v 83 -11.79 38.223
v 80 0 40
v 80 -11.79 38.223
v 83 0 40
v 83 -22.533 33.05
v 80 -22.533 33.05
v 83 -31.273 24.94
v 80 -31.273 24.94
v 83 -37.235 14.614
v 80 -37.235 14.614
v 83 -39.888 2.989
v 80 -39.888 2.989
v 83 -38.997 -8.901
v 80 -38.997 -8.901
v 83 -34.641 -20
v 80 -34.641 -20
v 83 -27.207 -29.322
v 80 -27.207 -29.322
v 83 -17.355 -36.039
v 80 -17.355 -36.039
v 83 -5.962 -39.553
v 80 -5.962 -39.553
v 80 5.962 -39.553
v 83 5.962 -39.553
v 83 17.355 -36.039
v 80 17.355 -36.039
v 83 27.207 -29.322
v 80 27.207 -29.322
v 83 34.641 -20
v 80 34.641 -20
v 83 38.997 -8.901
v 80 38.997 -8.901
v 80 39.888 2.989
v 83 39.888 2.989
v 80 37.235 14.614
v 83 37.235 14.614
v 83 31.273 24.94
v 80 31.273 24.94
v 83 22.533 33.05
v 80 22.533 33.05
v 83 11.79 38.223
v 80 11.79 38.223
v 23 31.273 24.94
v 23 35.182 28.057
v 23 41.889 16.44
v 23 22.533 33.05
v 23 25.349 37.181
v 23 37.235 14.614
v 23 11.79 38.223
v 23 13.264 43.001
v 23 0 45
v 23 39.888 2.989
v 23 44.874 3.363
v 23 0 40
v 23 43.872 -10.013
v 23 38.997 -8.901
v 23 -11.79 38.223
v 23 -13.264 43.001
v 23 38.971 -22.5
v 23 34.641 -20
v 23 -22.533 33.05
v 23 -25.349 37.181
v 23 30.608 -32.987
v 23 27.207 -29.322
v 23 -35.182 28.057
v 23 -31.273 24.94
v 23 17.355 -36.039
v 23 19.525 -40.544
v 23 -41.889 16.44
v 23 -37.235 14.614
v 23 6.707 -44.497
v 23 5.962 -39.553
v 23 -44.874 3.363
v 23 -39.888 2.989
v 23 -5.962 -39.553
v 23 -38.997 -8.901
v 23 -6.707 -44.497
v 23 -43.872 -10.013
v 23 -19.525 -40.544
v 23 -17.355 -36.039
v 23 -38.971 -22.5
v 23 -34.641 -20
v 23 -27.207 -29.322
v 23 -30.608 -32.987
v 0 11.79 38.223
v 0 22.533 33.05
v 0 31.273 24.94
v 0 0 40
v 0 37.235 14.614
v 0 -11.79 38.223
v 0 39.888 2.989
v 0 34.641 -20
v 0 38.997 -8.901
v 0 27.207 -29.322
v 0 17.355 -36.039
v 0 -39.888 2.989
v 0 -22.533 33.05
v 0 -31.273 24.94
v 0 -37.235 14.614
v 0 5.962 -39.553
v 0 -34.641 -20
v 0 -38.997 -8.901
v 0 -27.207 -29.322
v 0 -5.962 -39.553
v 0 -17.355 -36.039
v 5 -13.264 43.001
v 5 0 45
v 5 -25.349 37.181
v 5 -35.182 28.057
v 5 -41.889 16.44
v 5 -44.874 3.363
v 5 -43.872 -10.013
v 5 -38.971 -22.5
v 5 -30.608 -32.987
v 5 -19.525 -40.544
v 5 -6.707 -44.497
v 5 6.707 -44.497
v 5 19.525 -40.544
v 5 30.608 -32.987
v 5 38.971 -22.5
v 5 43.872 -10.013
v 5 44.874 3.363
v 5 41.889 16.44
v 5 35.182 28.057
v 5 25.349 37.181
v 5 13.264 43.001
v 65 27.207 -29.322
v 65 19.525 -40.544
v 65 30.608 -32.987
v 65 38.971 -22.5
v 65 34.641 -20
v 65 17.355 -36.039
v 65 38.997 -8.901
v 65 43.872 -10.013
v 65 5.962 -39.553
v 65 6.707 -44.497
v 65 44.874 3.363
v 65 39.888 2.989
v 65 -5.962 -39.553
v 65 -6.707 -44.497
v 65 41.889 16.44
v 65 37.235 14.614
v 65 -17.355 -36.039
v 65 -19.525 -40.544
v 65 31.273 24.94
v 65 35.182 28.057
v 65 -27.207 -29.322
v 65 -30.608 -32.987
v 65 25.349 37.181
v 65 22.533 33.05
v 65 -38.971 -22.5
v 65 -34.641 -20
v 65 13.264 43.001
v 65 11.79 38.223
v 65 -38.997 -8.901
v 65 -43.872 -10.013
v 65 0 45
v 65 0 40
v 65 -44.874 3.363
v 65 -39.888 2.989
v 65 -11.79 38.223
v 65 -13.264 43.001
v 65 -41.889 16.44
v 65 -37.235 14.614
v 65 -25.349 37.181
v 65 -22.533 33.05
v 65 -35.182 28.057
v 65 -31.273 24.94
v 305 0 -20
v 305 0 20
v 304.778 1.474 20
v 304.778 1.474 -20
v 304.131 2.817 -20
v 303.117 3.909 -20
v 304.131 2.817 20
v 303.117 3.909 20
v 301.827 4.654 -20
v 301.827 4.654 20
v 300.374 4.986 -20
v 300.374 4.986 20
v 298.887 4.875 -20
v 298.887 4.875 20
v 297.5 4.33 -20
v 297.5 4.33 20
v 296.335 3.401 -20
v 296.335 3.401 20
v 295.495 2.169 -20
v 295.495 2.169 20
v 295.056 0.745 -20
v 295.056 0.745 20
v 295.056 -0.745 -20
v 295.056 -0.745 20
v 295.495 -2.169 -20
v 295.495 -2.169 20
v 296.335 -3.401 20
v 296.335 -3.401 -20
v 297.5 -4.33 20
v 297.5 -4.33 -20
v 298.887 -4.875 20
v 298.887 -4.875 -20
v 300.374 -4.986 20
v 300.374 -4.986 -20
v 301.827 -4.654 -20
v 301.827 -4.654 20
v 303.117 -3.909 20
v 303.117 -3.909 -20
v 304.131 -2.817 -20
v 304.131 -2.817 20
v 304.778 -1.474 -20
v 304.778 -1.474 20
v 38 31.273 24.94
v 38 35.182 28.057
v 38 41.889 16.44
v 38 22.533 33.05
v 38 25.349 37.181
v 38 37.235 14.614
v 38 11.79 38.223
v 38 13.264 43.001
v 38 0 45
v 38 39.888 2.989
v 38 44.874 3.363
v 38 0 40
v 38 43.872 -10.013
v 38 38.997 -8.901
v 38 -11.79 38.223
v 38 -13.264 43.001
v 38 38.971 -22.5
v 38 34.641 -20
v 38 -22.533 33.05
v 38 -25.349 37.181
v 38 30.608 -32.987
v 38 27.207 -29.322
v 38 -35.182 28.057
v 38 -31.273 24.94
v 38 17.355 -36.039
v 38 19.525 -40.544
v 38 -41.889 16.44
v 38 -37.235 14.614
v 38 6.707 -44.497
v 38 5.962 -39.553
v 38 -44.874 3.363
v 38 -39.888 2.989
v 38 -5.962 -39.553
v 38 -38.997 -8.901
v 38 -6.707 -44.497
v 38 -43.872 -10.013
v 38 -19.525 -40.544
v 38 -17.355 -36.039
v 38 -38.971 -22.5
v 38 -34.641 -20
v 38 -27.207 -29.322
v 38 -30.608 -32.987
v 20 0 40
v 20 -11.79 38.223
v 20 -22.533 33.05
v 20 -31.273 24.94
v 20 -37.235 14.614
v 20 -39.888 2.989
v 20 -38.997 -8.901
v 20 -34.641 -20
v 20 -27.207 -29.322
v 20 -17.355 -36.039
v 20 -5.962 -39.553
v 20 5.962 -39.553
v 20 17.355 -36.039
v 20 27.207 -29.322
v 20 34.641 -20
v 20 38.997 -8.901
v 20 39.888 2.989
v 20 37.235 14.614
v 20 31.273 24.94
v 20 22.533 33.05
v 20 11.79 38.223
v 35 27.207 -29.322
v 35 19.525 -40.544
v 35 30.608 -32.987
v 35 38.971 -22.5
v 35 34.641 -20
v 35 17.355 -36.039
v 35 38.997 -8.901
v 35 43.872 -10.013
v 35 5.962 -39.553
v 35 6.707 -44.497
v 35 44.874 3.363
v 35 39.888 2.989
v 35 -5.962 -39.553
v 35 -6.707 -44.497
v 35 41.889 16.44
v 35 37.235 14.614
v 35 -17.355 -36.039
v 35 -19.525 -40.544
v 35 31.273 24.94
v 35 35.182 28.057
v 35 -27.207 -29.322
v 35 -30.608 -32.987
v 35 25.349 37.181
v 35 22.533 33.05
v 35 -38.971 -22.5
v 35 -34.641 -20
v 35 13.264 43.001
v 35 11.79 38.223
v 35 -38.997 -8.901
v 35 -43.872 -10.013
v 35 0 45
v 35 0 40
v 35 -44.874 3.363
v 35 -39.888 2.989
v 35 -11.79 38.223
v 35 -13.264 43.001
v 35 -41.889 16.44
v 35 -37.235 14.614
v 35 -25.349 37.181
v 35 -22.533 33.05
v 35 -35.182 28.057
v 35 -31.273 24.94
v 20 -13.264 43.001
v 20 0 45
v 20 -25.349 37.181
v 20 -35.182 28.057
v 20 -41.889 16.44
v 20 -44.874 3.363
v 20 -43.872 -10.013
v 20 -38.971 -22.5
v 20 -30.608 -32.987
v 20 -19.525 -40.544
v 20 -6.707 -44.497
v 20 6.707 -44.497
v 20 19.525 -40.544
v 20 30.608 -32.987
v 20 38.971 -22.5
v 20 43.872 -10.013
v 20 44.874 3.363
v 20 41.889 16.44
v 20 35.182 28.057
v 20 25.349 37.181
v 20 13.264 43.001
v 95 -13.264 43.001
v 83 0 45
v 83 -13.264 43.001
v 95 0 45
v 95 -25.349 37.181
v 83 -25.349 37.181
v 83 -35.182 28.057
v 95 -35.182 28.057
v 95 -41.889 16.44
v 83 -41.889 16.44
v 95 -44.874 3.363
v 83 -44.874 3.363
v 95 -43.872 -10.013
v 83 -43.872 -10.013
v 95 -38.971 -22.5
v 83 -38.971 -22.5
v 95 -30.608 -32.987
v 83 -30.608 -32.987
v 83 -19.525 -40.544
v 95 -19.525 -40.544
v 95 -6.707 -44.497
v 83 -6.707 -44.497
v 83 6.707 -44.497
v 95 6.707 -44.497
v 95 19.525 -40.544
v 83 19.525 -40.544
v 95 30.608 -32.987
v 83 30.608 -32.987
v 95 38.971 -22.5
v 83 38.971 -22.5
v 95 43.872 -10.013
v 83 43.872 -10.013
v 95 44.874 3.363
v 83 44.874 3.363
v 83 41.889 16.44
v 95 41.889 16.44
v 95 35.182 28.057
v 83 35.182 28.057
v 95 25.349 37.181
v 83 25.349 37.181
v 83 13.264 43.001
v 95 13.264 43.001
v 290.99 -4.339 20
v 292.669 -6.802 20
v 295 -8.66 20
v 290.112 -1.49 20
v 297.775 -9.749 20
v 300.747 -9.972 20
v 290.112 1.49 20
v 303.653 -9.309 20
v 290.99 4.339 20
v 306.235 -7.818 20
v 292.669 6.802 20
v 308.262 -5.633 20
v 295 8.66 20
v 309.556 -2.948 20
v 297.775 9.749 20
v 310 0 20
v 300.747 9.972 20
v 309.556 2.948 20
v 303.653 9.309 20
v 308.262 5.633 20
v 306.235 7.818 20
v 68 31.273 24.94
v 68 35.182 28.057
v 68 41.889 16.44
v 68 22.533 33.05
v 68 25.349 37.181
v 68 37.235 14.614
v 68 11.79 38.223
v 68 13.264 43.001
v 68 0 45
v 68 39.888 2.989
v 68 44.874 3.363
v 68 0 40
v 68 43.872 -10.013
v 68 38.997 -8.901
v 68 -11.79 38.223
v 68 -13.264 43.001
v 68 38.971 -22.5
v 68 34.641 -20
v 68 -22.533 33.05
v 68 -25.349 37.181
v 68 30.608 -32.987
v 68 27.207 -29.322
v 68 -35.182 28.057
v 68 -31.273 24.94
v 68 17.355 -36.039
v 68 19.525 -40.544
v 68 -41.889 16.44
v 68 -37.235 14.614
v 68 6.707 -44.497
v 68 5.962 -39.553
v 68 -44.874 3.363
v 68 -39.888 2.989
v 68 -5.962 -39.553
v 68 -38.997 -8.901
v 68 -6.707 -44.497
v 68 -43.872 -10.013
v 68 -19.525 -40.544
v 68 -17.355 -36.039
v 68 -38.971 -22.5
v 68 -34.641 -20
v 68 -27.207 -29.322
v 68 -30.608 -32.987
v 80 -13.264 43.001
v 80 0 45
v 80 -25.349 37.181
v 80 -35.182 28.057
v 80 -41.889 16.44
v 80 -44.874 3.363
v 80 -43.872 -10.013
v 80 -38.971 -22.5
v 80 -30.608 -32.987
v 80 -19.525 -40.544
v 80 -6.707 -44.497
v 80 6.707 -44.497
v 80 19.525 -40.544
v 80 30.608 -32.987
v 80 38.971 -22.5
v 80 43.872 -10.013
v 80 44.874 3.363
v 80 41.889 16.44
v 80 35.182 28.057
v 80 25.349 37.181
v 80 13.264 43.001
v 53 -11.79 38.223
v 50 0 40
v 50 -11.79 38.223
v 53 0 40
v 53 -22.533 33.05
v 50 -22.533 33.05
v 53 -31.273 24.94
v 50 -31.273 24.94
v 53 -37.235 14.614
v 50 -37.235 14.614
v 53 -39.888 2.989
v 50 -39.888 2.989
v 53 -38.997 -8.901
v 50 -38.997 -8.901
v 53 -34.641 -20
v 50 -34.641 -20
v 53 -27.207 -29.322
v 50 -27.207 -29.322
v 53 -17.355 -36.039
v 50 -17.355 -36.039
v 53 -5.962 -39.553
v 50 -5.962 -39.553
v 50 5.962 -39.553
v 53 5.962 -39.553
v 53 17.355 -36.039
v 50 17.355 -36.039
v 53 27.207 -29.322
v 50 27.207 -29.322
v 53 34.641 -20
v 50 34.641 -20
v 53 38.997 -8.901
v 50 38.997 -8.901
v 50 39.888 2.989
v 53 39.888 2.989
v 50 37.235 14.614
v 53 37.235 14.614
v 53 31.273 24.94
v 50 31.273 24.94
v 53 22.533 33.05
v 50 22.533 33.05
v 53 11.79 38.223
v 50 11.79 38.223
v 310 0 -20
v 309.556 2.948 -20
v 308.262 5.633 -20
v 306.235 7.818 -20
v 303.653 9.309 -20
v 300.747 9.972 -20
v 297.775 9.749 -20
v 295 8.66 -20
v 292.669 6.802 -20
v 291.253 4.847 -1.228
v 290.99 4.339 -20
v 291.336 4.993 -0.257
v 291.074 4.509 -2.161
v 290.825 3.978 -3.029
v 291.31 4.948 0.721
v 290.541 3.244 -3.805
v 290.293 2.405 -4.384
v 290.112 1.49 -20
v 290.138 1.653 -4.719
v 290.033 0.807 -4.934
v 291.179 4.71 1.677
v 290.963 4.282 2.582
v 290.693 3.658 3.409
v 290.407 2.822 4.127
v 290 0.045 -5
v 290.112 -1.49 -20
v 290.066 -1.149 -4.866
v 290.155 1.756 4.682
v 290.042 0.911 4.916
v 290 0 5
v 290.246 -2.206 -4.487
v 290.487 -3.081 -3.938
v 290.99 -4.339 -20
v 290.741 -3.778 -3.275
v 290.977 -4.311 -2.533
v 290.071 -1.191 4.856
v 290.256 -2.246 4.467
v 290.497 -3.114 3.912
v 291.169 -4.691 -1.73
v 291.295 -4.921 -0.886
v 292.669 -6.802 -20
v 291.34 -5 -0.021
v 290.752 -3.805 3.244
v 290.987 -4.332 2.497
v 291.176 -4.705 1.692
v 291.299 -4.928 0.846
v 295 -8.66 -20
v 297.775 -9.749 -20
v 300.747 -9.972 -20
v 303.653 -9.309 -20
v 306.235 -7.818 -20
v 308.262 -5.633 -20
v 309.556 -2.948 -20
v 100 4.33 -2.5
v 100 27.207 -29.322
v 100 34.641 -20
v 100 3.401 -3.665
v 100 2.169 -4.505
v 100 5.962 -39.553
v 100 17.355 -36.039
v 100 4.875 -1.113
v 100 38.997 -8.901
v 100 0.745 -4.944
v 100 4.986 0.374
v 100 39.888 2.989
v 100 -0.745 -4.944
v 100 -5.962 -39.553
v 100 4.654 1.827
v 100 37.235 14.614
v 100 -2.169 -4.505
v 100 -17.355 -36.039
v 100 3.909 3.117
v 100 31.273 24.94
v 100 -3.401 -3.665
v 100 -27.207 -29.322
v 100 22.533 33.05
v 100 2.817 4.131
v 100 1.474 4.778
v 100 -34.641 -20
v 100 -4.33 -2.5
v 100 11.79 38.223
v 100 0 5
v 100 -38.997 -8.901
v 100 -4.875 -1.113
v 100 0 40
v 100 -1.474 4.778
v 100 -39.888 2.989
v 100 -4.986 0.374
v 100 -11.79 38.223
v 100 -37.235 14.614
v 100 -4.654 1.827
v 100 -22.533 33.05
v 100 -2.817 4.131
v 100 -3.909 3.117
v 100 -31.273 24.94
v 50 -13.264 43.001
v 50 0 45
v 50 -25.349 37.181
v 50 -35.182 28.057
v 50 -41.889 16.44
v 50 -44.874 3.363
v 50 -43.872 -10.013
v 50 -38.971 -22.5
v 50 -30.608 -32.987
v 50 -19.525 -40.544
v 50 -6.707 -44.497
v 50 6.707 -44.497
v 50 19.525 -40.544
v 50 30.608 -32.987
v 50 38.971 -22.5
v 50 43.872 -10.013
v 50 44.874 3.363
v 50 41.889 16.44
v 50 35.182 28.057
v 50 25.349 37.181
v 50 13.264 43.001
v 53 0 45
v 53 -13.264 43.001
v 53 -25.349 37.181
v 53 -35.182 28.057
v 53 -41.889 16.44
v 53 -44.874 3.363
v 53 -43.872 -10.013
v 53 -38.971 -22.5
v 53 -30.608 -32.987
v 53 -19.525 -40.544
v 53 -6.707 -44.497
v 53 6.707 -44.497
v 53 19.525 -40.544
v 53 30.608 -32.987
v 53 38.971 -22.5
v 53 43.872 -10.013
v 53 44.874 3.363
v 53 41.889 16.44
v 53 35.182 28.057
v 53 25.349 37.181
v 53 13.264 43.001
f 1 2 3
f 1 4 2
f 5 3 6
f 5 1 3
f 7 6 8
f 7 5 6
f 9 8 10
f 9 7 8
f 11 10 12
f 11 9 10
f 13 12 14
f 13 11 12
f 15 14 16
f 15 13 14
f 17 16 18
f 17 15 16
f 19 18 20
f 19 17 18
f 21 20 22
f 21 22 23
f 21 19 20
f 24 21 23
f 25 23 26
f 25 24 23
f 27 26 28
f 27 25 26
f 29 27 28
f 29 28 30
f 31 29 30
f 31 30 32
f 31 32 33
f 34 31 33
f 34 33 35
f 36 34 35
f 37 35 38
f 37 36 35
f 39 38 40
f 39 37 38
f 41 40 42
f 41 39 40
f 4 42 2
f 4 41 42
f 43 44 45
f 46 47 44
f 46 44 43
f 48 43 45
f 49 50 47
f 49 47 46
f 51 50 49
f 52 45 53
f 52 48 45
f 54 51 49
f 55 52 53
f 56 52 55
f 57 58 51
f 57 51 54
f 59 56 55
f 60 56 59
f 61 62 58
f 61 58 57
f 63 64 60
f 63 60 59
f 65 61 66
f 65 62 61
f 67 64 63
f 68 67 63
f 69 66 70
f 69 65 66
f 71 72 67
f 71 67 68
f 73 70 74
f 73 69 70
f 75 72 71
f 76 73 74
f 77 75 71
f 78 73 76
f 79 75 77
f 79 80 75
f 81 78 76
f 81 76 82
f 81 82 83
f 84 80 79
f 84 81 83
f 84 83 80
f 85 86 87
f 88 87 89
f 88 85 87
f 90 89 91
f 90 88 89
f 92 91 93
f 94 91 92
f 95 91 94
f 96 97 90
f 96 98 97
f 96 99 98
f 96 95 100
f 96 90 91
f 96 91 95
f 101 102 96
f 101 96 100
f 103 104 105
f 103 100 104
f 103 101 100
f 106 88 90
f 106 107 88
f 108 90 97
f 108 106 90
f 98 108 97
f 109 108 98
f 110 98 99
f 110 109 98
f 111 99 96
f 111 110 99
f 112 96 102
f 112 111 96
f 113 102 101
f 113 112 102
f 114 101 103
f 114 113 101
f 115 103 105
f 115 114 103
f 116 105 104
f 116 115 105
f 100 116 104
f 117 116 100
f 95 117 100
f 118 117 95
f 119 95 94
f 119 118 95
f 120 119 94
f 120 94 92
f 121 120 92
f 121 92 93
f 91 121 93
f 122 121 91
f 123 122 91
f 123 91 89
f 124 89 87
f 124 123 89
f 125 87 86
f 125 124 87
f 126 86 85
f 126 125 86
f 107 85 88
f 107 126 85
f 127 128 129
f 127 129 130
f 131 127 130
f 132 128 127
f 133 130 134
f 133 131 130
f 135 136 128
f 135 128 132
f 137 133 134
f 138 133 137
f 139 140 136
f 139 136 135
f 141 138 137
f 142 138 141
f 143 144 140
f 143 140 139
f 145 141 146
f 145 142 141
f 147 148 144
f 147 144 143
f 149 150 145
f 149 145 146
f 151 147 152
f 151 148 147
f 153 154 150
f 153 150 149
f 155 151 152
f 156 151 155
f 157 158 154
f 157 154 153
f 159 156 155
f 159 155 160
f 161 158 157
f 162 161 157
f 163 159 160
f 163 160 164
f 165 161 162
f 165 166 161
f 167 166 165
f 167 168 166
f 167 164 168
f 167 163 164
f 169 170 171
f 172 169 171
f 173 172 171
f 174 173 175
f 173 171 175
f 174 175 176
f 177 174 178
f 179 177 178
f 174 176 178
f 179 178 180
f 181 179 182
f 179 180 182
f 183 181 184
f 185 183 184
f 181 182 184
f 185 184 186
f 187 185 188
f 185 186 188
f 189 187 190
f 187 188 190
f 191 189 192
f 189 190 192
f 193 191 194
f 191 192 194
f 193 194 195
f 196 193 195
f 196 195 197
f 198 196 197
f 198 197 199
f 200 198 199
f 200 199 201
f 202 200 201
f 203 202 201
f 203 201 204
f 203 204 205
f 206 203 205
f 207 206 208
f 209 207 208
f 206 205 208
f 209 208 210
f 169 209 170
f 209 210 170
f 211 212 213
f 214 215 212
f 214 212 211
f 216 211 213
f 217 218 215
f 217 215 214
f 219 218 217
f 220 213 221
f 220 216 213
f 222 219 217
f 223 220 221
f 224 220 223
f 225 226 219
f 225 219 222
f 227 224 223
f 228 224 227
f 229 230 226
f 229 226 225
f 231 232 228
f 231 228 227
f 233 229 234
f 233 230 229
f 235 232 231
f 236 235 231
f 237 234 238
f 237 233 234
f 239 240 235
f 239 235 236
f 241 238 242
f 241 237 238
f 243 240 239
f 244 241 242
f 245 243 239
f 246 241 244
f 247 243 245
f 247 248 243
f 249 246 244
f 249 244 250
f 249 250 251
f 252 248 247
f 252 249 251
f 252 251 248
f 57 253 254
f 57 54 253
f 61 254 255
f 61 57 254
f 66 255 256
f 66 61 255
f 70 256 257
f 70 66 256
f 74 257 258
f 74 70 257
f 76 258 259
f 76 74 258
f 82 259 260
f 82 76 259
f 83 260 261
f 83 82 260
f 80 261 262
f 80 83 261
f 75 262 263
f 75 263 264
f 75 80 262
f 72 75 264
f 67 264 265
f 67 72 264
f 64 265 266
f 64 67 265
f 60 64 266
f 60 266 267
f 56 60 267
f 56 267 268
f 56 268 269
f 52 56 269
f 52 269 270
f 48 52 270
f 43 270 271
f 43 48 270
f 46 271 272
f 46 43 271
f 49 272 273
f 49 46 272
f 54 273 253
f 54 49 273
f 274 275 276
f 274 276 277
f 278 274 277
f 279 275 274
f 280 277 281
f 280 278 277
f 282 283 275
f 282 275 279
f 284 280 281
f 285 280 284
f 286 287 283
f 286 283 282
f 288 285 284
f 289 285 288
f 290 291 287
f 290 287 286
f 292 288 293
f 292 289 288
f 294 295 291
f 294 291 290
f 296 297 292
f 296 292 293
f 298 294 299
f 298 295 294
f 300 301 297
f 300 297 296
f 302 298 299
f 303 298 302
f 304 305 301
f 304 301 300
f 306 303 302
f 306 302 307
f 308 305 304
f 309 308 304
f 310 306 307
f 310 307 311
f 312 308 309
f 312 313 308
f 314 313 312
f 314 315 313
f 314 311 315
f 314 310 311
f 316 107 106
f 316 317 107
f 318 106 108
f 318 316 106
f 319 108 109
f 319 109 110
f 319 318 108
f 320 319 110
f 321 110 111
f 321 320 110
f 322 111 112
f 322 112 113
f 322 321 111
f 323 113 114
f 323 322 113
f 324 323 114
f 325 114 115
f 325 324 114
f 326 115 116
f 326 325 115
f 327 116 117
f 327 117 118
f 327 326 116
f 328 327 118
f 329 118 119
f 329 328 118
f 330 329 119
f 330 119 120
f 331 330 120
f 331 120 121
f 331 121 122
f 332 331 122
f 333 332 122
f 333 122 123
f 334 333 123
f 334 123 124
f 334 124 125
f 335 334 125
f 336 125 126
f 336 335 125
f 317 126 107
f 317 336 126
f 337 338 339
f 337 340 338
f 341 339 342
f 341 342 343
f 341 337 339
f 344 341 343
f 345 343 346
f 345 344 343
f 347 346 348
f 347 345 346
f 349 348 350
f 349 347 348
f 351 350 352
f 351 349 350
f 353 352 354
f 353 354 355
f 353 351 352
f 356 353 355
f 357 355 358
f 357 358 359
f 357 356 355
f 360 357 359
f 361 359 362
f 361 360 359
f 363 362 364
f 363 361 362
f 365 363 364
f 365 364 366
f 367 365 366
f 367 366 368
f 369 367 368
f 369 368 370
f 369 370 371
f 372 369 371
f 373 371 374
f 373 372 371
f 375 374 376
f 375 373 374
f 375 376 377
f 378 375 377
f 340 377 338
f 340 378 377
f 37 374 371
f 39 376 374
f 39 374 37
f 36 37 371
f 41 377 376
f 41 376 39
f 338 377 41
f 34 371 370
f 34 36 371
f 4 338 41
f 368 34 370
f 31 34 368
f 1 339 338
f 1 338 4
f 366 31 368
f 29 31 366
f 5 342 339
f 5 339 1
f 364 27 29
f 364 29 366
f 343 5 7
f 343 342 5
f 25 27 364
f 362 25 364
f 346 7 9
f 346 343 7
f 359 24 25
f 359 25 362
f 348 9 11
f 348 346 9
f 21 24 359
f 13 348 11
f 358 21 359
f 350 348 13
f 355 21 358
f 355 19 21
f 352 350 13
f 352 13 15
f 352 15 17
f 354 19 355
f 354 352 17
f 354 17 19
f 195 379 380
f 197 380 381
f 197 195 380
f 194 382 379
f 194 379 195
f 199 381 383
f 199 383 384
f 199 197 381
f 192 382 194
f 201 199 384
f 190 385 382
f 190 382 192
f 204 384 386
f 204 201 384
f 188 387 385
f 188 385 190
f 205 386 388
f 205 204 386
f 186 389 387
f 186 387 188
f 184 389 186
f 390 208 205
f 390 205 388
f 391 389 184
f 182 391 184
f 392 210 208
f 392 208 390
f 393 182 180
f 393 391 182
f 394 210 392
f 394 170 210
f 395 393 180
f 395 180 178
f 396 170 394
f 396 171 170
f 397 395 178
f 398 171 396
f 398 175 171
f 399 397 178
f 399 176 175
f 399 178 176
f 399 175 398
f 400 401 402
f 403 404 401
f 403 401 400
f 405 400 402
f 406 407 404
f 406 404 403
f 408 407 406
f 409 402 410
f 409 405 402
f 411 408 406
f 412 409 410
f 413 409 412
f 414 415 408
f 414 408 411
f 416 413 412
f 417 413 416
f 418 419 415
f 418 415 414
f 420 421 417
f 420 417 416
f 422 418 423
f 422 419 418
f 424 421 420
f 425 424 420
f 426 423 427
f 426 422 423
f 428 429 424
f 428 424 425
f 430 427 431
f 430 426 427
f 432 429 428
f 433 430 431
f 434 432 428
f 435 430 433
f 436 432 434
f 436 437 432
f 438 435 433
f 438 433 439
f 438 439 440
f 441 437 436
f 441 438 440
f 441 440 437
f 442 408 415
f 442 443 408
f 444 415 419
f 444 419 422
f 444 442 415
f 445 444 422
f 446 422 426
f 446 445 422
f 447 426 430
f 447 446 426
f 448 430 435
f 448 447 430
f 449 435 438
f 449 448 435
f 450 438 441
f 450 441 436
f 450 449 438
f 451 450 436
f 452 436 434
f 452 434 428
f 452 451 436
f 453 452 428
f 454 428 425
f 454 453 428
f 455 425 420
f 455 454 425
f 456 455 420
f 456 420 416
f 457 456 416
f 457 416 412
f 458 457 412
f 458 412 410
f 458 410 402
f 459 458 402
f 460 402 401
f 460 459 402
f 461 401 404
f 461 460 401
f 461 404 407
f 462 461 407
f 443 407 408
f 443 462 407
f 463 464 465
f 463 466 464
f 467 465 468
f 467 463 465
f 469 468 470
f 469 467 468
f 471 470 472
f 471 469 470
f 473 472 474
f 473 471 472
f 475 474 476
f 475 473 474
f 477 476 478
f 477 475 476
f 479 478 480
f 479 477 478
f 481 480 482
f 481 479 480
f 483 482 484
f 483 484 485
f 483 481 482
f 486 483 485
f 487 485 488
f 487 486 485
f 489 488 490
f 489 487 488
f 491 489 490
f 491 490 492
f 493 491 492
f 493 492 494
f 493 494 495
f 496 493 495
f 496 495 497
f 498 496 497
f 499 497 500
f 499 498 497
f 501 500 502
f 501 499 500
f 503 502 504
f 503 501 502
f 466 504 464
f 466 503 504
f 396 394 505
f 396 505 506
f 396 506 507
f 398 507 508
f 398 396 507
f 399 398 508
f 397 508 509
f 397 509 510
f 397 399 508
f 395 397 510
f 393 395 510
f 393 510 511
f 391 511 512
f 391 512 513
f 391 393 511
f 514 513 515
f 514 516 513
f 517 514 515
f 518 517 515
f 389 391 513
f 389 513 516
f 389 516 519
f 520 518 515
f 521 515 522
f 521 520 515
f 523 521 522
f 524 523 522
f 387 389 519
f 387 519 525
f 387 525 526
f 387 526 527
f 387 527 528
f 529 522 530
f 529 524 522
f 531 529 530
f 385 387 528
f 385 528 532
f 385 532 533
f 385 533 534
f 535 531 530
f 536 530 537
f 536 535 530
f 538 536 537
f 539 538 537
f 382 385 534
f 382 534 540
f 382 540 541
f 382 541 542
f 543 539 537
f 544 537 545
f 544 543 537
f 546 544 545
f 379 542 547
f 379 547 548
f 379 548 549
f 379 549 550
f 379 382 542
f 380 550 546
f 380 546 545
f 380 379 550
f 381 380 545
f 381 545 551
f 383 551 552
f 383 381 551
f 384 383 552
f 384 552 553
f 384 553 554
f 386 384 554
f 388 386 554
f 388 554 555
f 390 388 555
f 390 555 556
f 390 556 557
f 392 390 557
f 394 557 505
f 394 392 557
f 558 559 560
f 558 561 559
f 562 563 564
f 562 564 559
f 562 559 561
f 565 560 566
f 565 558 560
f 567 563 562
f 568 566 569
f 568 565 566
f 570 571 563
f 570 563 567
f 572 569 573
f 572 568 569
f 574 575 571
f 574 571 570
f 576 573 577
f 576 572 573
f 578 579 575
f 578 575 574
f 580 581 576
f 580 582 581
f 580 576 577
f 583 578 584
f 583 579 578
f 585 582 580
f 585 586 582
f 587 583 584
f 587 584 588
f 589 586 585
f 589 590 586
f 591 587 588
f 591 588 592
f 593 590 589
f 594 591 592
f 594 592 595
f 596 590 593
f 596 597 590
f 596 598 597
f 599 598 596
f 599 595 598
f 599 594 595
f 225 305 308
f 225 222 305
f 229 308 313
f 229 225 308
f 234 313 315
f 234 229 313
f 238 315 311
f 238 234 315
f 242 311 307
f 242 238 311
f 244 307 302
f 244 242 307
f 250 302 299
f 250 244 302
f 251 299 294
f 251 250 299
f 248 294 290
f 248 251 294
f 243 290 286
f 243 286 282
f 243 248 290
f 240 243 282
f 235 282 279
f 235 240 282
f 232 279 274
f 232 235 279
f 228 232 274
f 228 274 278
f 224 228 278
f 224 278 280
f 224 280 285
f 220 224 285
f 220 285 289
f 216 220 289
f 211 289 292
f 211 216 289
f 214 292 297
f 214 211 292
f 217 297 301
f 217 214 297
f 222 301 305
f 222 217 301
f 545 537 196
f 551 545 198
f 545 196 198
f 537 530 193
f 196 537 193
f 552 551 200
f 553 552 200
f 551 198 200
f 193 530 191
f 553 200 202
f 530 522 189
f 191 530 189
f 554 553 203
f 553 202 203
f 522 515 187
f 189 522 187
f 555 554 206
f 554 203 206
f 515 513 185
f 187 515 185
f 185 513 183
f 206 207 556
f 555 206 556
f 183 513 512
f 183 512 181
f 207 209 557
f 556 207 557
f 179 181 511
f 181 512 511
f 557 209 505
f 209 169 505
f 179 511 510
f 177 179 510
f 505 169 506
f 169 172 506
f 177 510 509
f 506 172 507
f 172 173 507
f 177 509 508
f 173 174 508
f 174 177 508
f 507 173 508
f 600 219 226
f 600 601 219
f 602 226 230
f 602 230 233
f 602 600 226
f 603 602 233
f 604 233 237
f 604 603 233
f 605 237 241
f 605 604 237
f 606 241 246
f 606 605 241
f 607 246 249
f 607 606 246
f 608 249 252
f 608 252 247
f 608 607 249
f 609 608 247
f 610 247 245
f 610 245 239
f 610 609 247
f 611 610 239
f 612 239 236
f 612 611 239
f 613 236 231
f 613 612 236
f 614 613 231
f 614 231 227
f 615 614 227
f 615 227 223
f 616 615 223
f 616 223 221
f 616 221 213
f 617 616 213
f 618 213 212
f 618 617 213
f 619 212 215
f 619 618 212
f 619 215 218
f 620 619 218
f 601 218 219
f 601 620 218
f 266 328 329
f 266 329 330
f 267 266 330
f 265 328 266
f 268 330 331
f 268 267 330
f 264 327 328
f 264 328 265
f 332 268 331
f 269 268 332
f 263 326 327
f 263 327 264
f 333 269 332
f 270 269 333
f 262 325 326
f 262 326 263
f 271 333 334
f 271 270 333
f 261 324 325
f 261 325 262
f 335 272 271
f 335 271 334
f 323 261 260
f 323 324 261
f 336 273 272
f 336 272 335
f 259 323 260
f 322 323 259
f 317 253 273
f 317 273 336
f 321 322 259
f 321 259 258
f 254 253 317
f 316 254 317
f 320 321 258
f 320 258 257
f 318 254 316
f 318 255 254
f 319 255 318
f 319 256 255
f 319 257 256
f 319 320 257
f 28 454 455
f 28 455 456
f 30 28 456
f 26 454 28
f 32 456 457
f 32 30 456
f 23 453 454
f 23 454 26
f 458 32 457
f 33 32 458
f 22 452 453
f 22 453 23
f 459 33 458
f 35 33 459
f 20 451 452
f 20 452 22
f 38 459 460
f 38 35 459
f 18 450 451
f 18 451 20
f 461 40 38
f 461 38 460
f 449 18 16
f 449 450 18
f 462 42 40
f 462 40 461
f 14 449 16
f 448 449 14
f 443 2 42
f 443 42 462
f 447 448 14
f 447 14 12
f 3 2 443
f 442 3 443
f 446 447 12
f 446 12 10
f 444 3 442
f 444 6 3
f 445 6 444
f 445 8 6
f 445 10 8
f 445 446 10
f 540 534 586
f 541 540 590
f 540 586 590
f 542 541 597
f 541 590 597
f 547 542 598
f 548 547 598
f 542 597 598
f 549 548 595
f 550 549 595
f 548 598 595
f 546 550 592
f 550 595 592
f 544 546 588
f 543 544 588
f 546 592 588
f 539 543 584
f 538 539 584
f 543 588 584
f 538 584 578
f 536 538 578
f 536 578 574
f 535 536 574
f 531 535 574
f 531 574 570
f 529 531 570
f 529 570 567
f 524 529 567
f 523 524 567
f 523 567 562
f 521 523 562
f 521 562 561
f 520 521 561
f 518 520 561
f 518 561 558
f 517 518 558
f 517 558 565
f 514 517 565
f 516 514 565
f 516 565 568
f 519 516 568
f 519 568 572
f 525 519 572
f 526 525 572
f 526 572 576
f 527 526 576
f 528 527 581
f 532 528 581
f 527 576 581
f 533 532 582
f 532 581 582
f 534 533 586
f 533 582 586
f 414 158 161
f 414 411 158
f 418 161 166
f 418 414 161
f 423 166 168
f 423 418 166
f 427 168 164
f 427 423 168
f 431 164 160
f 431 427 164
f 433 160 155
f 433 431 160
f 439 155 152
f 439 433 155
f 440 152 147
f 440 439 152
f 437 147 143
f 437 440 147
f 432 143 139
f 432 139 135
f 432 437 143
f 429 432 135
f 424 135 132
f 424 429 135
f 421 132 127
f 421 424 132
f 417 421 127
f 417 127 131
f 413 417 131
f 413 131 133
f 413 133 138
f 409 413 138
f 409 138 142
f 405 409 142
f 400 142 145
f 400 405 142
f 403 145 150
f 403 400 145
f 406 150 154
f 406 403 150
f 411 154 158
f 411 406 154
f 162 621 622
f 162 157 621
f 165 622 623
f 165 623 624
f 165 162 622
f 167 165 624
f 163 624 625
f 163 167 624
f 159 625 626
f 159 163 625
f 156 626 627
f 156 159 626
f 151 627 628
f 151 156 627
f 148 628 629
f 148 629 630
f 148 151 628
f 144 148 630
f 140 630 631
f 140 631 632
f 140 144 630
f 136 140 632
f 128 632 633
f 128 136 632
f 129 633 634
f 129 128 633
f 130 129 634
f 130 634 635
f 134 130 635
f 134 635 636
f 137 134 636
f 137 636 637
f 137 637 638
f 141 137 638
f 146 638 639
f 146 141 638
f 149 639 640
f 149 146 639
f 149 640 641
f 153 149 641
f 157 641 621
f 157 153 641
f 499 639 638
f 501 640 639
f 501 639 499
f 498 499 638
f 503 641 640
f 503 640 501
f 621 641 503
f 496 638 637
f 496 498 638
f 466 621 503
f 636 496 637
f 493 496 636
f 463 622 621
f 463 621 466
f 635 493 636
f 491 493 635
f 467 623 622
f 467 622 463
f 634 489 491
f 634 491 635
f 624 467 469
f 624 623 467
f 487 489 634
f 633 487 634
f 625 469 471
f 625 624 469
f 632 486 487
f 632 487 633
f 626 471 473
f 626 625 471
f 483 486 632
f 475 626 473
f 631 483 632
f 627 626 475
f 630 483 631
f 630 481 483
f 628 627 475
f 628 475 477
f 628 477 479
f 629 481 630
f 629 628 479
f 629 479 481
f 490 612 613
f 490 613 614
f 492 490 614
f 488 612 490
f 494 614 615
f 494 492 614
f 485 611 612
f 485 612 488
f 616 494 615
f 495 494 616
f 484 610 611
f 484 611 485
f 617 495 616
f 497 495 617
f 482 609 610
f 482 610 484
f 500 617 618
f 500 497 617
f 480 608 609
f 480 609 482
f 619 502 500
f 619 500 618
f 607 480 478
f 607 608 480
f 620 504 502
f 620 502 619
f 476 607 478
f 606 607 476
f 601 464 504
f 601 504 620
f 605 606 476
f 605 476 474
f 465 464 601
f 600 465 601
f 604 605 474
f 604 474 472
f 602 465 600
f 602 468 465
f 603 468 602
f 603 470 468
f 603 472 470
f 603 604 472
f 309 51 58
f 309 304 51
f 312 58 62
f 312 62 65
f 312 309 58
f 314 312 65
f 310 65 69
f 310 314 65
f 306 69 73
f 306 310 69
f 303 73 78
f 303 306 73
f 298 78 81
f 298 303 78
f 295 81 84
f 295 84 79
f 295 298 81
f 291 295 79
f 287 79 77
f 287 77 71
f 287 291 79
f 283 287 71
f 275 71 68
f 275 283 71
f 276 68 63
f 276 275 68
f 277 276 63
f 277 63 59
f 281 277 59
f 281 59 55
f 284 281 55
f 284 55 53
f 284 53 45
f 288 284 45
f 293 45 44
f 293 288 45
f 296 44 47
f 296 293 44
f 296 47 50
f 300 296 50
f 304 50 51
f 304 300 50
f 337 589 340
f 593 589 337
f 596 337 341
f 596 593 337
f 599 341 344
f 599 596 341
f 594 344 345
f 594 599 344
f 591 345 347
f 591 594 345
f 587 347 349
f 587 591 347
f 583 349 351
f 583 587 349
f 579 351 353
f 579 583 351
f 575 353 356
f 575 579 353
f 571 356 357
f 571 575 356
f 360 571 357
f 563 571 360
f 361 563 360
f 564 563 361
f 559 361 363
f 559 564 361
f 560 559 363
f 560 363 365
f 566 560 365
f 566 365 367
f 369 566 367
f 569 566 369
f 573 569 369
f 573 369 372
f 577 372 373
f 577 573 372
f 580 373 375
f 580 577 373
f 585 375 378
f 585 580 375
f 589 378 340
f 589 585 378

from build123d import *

# Parameters (mm, degrees)
SKETCH_2_R          = 5
EXTRUDE_1_DEPTH     = 200
SKETCH_3_R          = 10
EXTRUDE_2_DEPTH     = 20
SKETCH_4_R          = 5
CUT_EXTRUDE_1_DEPTH = 40


with BuildPart() as part:
    # Эскиз1 → Повернуть1 (revolve)
    with BuildSketch(Plane.XY, mode=Mode.PRIVATE) as revolve_1_sk:
        Polygon((0, 40), (5, 45), (20, 45), (20, 40), (23, 40), (23, 45), (35, 45), (35, 40), (38, 40), (38, 45), (50, 45), (50, 40), (53, 40), (53, 45), (65, 45), (65, 40), (68, 40), (68, 45), (80, 45), (80, 40), (83, 40), (83, 45), (95, 45), (100, 40), (100, 0), (0, 0), align=None)
    revolve(revolve_1_sk.sketch.rotate(Axis((-82.862068966, 0, 0), (1, 0, 0)), 90), axis=Axis((-82.862068966, 0, 0), (1, 0, 0)))

    # Эскиз2 → Бобышка-Вытянуть1 (add)
    with BuildSketch(Plane(origin=(100, 0, 0), x_dir=(0, 0, -1), z_dir=(1, 0, 0))):
        with Locations(Location((0, 0, 0), (0, 0, 180))):
            Circle(SKETCH_2_R)
    extrude(amount=EXTRUDE_1_DEPTH)

    # Эскиз3 → Бобышка-Вытянуть2 (add, symmetric)
    with BuildSketch(Plane.XY):
        with Locations((300, 0)):
            Circle(SKETCH_3_R)
    extrude(amount=EXTRUDE_2_DEPTH, both=True)

    # Эскиз4 → Вырез-Вытянуть1 (cut)
    with BuildSketch(Plane.XY.offset(20)):
        with Locations((300, 0)):
            Circle(SKETCH_4_R)
    extrude(amount=-CUT_EXTRUDE_1_DEPTH, mode=Mode.SUBTRACT)


solid = part.part
